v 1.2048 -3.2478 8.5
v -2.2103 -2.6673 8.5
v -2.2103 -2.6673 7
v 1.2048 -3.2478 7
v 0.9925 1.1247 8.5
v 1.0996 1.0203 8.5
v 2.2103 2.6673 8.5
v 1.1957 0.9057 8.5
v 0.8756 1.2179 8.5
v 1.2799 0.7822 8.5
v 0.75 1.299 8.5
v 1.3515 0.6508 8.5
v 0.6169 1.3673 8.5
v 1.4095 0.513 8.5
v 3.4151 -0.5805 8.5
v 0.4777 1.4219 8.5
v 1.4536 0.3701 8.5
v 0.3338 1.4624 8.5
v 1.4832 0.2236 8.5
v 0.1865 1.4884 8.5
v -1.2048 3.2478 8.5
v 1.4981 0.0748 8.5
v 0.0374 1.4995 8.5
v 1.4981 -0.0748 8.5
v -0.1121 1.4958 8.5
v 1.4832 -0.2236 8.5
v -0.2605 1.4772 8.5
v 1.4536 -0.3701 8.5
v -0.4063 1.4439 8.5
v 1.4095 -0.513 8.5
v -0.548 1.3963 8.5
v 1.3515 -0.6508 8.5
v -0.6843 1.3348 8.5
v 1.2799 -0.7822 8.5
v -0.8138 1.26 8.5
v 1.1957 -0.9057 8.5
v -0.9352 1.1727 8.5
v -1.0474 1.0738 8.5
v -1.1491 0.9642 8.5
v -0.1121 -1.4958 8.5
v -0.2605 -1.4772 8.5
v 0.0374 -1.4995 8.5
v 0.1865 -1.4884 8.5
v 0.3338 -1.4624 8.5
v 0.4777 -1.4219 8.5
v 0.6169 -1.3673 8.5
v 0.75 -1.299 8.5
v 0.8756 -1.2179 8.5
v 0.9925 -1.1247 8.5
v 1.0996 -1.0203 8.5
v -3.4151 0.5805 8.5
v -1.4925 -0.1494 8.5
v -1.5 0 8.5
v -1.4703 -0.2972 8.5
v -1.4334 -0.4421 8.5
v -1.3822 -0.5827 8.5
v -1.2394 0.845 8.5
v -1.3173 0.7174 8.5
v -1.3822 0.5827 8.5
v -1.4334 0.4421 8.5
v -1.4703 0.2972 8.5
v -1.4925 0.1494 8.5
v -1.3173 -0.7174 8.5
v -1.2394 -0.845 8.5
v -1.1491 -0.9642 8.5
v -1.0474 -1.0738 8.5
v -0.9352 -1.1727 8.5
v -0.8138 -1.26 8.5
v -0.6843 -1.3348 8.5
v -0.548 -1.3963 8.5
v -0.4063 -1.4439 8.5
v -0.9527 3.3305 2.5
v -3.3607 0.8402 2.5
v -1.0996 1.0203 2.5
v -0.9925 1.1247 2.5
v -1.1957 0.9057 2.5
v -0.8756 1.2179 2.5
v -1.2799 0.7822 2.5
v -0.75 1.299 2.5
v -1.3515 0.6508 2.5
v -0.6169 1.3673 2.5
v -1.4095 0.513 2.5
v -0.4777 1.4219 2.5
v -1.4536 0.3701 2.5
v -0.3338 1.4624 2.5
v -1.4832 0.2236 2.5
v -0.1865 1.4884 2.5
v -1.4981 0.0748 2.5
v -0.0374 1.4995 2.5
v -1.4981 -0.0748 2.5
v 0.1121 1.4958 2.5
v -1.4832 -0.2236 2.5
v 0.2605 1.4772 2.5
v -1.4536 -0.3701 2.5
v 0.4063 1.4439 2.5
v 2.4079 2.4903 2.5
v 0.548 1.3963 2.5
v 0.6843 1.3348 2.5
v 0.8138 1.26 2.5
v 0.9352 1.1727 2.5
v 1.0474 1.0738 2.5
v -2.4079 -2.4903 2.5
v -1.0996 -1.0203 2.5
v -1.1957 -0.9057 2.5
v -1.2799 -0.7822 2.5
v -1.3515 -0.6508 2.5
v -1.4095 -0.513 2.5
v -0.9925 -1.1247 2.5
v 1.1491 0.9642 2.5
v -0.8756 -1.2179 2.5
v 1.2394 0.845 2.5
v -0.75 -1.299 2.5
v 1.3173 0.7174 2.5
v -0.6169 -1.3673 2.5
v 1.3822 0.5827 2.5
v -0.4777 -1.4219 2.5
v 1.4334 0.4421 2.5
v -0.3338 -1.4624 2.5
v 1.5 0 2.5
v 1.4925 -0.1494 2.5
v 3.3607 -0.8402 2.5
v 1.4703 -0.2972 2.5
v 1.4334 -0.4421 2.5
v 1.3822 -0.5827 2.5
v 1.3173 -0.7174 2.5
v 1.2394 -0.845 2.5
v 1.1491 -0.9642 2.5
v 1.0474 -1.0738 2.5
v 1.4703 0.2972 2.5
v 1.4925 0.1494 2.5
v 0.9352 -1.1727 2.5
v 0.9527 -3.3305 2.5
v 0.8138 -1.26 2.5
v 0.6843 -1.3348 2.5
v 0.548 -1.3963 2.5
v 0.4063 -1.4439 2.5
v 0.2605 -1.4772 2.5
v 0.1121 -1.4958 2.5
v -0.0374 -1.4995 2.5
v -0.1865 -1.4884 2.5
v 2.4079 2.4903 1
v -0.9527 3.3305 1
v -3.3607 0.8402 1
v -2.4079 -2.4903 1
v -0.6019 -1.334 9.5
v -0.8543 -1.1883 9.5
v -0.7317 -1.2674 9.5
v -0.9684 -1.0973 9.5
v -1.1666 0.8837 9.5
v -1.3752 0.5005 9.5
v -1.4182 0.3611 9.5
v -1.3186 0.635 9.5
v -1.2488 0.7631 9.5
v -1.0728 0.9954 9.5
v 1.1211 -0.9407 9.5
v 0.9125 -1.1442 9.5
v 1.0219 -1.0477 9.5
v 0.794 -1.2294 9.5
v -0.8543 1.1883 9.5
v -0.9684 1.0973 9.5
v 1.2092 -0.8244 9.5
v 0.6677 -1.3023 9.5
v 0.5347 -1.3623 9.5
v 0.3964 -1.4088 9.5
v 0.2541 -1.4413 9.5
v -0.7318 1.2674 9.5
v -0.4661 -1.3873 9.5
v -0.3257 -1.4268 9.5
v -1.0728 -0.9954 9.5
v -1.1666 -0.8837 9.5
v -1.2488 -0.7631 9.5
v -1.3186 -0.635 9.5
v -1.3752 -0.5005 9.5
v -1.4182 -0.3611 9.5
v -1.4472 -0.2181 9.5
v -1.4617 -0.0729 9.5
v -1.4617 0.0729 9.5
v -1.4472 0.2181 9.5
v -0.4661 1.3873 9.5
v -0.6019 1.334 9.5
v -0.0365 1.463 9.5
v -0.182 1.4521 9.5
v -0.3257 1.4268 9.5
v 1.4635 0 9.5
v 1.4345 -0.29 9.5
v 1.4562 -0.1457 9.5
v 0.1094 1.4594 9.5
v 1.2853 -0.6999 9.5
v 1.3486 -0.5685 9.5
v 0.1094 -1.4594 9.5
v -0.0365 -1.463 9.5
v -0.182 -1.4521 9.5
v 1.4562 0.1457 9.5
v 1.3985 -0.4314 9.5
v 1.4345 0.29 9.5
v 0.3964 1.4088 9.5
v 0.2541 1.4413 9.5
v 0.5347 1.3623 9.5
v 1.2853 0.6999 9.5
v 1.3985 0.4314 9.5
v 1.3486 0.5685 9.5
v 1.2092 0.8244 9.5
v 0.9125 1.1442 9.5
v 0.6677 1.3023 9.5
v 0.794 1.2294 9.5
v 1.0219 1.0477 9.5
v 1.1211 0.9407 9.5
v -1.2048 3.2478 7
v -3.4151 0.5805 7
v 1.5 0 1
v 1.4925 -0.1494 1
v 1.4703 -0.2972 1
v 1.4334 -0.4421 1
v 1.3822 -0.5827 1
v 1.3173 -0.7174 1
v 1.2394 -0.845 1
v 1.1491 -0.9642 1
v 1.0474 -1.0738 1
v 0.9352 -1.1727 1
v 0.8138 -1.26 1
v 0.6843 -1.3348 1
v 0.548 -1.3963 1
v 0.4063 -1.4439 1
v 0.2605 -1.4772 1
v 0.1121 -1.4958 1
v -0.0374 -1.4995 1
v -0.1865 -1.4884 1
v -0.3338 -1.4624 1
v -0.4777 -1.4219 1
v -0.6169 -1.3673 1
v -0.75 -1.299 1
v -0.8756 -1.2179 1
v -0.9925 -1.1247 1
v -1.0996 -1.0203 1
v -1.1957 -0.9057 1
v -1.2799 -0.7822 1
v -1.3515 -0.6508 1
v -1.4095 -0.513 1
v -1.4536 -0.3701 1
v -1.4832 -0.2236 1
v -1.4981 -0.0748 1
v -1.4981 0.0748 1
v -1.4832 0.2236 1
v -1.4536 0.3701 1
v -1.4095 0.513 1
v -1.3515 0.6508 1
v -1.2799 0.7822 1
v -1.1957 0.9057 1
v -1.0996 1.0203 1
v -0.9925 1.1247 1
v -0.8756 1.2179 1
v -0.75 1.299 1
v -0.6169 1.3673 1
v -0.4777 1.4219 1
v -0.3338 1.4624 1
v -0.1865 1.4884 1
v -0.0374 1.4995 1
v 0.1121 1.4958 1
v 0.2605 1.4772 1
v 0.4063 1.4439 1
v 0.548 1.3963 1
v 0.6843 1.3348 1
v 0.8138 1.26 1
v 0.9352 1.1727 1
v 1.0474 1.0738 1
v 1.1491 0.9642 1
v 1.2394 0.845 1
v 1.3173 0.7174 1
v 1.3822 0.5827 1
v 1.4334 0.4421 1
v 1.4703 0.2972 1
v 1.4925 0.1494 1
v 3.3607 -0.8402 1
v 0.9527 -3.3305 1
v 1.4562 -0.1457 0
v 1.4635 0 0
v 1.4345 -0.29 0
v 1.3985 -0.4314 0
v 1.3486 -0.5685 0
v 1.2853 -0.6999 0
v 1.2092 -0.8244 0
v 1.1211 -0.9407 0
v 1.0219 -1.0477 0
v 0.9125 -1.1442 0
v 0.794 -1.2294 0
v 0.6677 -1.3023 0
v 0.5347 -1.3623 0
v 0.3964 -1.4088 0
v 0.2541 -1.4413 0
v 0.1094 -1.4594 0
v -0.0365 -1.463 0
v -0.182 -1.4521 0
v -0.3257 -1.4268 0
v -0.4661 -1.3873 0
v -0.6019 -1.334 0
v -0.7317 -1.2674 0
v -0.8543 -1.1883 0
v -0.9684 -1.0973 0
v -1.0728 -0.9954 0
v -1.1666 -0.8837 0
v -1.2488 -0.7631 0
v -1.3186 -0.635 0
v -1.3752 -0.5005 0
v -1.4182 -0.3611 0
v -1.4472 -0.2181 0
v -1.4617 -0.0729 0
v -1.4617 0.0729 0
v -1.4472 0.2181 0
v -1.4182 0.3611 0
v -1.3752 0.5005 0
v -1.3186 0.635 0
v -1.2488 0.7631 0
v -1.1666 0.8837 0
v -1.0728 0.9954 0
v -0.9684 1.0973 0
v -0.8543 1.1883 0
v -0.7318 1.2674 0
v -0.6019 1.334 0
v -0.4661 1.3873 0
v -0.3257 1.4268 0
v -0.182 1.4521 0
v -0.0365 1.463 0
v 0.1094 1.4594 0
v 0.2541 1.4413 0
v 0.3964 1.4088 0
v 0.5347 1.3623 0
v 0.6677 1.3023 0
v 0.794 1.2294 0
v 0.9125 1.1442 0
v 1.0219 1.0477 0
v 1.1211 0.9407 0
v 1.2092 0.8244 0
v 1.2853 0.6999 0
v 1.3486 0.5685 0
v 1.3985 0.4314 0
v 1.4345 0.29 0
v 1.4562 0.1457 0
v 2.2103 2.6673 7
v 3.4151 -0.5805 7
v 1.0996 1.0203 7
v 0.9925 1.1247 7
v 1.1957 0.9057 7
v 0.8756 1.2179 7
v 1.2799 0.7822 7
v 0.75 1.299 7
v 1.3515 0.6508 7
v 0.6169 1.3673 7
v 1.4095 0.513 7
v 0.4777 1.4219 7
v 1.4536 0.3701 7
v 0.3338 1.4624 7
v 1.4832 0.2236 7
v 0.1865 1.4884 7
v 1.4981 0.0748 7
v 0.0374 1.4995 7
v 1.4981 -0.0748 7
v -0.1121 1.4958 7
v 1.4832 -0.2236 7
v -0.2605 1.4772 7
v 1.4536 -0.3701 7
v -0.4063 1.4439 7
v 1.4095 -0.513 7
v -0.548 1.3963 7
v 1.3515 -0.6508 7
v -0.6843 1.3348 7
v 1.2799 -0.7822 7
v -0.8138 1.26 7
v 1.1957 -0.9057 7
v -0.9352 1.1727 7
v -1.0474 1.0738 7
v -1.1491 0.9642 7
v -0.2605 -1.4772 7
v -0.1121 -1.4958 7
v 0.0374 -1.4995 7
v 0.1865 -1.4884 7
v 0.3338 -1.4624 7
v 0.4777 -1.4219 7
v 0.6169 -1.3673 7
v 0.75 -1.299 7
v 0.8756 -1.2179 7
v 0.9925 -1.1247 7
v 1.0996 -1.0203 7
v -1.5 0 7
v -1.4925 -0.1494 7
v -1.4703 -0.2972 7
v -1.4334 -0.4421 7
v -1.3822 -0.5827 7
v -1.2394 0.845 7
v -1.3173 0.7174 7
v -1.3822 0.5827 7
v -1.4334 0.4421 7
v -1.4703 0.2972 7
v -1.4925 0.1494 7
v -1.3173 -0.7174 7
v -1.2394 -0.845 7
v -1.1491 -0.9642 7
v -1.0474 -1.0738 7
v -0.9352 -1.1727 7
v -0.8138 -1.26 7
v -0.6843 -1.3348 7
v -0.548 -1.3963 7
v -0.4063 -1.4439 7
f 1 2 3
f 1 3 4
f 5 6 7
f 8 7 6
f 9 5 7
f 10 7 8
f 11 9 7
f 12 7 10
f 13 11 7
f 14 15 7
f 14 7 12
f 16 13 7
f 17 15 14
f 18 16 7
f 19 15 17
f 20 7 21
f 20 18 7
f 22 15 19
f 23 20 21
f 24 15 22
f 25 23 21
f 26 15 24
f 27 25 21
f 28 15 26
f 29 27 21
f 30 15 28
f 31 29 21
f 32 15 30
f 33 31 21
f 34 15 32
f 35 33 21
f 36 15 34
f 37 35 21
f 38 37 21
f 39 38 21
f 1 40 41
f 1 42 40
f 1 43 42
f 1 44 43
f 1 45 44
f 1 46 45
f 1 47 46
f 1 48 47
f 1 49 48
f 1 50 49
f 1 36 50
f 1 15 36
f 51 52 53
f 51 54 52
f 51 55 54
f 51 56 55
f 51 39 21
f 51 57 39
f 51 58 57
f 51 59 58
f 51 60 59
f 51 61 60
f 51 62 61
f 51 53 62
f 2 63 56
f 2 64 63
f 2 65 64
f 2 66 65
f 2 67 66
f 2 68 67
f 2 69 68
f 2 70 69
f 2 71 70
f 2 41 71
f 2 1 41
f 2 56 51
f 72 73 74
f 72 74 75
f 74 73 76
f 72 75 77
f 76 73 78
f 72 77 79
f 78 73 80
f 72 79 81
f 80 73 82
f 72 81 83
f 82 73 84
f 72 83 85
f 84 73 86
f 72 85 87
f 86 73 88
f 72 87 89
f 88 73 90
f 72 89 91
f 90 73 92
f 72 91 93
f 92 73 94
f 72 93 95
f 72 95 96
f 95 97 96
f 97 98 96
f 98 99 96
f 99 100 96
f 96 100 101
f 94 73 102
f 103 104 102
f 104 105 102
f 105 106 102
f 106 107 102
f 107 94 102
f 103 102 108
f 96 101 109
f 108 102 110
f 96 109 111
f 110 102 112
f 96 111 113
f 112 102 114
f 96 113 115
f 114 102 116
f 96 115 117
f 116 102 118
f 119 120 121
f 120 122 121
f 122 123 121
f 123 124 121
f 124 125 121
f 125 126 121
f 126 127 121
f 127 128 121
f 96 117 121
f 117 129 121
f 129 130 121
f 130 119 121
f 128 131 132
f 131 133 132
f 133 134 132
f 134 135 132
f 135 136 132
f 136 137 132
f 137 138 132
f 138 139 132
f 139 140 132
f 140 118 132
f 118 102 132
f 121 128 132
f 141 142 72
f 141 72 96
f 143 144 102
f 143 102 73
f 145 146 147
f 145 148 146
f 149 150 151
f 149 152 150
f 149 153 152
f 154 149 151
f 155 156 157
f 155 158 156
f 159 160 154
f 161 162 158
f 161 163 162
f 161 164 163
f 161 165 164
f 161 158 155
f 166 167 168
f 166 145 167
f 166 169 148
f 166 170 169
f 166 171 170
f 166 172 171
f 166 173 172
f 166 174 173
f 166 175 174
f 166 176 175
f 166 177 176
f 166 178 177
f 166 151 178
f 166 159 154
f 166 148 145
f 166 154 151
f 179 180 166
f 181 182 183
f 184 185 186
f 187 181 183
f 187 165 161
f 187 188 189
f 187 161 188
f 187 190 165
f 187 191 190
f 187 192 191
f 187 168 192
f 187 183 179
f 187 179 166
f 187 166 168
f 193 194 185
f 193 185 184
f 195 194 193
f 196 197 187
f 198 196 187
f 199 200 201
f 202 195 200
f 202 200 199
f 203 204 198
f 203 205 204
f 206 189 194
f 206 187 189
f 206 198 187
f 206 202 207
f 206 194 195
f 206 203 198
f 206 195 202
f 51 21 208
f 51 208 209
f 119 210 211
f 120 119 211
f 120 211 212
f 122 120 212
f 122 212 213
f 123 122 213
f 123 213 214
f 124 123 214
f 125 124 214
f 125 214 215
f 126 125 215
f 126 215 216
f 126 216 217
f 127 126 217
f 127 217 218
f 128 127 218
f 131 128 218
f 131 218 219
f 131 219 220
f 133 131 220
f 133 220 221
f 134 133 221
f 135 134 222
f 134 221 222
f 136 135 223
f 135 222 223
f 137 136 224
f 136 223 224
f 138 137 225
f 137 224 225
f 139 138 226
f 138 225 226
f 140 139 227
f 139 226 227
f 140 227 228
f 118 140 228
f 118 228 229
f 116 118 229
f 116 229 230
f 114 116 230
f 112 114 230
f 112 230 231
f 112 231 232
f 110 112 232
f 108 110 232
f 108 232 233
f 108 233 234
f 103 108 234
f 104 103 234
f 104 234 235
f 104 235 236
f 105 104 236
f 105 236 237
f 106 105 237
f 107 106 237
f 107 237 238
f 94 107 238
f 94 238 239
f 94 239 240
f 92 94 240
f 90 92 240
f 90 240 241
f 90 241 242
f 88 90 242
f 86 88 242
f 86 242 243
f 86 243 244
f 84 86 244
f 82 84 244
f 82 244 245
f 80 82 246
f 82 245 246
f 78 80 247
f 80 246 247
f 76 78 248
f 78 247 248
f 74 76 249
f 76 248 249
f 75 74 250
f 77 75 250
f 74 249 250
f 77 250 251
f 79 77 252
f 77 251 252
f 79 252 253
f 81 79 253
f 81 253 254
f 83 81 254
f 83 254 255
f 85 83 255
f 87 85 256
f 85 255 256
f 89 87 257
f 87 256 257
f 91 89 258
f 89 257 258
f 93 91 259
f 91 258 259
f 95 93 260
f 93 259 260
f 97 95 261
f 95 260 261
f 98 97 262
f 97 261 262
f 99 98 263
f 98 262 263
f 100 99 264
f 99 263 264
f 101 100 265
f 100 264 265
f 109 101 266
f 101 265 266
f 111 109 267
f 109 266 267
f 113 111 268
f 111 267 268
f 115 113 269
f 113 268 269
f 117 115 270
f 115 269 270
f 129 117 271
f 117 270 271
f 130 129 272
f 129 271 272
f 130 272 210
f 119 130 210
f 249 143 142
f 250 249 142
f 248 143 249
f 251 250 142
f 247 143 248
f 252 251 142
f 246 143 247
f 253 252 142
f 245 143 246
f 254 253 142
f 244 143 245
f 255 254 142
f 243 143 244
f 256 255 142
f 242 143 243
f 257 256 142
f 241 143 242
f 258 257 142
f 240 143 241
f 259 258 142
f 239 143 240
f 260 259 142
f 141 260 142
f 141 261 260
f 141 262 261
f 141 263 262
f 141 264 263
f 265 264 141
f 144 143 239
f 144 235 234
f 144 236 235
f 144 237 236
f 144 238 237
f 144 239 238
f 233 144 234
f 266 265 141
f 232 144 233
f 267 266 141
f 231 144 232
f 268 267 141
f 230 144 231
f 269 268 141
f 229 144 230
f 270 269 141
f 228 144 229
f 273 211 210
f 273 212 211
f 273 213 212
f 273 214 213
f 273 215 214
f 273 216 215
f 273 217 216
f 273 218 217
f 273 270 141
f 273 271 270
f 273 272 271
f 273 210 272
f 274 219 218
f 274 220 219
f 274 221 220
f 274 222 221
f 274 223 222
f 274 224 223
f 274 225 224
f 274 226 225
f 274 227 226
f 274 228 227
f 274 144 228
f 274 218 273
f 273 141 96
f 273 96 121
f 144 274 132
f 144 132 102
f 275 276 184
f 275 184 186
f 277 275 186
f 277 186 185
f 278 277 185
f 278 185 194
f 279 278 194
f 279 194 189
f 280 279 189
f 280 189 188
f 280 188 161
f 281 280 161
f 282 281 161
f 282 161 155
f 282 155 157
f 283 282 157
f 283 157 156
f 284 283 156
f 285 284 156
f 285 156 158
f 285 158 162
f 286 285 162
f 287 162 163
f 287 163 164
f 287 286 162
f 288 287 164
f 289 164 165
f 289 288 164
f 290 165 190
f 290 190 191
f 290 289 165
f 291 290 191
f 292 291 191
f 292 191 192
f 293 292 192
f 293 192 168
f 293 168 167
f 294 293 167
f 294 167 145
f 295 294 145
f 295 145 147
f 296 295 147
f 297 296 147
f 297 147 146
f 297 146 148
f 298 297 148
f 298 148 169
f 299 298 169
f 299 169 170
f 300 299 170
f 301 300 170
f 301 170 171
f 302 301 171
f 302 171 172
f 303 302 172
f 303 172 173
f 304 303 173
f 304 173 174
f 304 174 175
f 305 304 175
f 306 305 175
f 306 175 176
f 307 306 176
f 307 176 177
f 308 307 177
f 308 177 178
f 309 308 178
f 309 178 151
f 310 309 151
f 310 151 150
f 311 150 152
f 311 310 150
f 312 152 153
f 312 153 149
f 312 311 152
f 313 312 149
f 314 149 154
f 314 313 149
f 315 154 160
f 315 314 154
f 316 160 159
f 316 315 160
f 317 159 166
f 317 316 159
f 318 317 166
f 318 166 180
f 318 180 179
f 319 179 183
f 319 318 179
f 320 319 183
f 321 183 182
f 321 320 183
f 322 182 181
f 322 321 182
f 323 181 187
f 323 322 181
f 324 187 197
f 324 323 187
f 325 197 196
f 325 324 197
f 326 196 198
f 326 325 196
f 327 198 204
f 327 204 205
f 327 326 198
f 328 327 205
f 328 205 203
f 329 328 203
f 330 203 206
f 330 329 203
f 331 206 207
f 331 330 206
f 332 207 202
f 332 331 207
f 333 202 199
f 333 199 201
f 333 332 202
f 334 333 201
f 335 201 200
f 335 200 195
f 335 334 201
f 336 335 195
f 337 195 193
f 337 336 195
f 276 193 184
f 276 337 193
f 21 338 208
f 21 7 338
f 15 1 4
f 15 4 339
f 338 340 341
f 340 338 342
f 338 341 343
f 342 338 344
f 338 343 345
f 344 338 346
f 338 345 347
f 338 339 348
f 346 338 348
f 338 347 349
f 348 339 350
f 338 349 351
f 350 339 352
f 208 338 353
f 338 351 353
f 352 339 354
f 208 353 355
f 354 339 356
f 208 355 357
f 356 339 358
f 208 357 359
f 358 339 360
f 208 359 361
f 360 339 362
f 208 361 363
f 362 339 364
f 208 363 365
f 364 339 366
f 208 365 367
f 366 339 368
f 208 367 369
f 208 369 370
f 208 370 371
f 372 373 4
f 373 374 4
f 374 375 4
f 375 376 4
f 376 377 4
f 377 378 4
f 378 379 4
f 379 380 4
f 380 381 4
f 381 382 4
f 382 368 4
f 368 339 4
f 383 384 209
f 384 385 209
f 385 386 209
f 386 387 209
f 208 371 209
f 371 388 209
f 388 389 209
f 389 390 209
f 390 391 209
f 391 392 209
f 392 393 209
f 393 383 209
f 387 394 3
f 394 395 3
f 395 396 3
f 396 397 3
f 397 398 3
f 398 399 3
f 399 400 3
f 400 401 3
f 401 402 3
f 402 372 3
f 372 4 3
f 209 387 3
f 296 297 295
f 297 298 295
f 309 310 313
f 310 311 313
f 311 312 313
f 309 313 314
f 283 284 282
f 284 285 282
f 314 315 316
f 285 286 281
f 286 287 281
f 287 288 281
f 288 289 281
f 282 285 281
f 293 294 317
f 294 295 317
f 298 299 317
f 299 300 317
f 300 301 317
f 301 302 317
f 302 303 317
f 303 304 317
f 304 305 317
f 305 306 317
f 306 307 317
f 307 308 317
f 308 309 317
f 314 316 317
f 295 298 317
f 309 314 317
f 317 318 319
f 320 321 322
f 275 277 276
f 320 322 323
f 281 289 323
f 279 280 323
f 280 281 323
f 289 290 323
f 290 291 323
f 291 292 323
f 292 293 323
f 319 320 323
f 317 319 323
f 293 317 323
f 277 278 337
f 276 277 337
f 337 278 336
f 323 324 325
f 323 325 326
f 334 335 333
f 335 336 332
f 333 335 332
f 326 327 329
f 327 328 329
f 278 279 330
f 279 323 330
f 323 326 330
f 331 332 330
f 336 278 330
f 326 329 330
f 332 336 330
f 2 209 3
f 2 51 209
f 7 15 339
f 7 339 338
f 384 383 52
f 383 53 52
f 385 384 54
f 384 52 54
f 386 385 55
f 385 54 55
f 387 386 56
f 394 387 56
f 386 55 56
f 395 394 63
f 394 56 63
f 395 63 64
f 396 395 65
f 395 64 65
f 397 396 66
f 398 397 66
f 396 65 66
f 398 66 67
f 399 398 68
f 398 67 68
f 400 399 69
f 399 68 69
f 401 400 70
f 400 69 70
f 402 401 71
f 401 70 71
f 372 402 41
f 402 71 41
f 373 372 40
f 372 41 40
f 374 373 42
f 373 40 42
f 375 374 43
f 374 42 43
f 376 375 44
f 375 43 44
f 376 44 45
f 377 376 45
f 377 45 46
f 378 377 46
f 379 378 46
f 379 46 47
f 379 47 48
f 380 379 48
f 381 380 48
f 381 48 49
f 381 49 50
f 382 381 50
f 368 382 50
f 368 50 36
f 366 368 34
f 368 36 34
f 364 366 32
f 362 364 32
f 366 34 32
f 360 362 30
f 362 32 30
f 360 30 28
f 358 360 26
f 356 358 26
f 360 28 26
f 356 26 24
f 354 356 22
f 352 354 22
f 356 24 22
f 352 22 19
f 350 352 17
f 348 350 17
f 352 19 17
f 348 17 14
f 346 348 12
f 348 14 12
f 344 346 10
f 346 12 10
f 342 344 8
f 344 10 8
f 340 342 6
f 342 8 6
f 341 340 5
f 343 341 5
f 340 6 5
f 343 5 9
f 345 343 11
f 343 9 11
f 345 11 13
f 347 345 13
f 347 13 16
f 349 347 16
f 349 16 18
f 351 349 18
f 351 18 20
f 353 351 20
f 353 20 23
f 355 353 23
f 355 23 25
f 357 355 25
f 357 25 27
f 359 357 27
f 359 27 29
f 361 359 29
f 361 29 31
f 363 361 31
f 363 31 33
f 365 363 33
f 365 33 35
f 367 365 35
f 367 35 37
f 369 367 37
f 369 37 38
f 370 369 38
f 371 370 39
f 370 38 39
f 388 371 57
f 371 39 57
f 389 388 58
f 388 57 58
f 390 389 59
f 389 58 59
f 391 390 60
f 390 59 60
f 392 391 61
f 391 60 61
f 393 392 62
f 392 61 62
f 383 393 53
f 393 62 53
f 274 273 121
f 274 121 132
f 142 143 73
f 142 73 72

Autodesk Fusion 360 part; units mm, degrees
sketch "Sketch1" plane through (0, 0, 0) normal (0, 0, 1) x (1, 0, 0)
  circle A0 centre (0, 0) radius 1.5
  dimension "d1" = 3
extrude "Extrude1" add sketch "Sketch1" along normal blind 9.5 makes body 1
thread "Thread1" "ISO Metric profile 3.0 M3x0.5 6g" major diameter 2.927 minor diameter 2.3555 pitch 0.5 angle 60 resizes the face on face at (1.4981, -0.0748, 6.3333) on bodies 1
sketch "Sketch2" plane through (0, 0, 9.5) normal (0, 0, 1) x (-1, 0, 0)
  circle A0 centre (0, 0) radius 1.4635
  circle A1 centre (0, 0) radius 1.5
  line L0 (-2.2103, -2.6673) -> (1.2048, -3.2478)
  line L1 (1.2048, -3.2478) -> (3.4151, -0.5805)
  line L2 (3.4151, -0.5805) -> (2.2103, 2.6673)
  line L3 (2.2103, 2.6673) -> (-1.2048, 3.2478)
  line L4 (-1.2048, 3.2478) -> (-3.4151, 0.5805)
  line L5 (-3.4151, 0.5805) -> (-2.2103, -2.6673)
  dimension "d4" = 3
  dimension "d5" = 3
extrude "Extrude2" add sketch "Sketch2" against normal blind 2.5 separate body contours L0 L1 L2 L3 L4 L5 makes body 2
extrude "Extrude3" cut 1 faces at (1.9065, -1.6162, 9.5) along direction (0, 0, -1) blind 1 on bodies 2 bodies 2
sketch "Sketch3" plane through (0, 0, 0) normal (0, 0, -1) x (1, 0, 0)
  circle A0 centre (0, 0) radius 1.4635
  line L0 (2.4079, -2.4903) -> (3.3607, 0.8402)
  line L1 (3.3607, 0.8402) -> (0.9527, 3.3305)
  line L2 (0.9527, 3.3305) -> (-2.4079, 2.4903)
  line L3 (-2.4079, 2.4903) -> (-3.3607, -0.8402)
  line L4 (-3.3607, -0.8402) -> (-0.9527, -3.3305)
  line L5 (-0.9527, -3.3305) -> (2.4079, -2.4903)
  circle A1 centre (0, 0) radius 1.5
  dimension "d10" = 3
  dimension "d11" = 3
extrude "Extrude4" add sketch "Sketch3" against normal blind 2.5 separate body contours L0 L1 L2 L3 L4 L5 makes body 3
extrude "Extrude5" cut 1 faces at (-1.8043, 1.7303, 0) along direction (0, 0, 1) blind 1 on bodies 3 bodies 3
equation "d2 = 4.5 mm + 1.5 mm + 1.5 mm + 2 mm"
